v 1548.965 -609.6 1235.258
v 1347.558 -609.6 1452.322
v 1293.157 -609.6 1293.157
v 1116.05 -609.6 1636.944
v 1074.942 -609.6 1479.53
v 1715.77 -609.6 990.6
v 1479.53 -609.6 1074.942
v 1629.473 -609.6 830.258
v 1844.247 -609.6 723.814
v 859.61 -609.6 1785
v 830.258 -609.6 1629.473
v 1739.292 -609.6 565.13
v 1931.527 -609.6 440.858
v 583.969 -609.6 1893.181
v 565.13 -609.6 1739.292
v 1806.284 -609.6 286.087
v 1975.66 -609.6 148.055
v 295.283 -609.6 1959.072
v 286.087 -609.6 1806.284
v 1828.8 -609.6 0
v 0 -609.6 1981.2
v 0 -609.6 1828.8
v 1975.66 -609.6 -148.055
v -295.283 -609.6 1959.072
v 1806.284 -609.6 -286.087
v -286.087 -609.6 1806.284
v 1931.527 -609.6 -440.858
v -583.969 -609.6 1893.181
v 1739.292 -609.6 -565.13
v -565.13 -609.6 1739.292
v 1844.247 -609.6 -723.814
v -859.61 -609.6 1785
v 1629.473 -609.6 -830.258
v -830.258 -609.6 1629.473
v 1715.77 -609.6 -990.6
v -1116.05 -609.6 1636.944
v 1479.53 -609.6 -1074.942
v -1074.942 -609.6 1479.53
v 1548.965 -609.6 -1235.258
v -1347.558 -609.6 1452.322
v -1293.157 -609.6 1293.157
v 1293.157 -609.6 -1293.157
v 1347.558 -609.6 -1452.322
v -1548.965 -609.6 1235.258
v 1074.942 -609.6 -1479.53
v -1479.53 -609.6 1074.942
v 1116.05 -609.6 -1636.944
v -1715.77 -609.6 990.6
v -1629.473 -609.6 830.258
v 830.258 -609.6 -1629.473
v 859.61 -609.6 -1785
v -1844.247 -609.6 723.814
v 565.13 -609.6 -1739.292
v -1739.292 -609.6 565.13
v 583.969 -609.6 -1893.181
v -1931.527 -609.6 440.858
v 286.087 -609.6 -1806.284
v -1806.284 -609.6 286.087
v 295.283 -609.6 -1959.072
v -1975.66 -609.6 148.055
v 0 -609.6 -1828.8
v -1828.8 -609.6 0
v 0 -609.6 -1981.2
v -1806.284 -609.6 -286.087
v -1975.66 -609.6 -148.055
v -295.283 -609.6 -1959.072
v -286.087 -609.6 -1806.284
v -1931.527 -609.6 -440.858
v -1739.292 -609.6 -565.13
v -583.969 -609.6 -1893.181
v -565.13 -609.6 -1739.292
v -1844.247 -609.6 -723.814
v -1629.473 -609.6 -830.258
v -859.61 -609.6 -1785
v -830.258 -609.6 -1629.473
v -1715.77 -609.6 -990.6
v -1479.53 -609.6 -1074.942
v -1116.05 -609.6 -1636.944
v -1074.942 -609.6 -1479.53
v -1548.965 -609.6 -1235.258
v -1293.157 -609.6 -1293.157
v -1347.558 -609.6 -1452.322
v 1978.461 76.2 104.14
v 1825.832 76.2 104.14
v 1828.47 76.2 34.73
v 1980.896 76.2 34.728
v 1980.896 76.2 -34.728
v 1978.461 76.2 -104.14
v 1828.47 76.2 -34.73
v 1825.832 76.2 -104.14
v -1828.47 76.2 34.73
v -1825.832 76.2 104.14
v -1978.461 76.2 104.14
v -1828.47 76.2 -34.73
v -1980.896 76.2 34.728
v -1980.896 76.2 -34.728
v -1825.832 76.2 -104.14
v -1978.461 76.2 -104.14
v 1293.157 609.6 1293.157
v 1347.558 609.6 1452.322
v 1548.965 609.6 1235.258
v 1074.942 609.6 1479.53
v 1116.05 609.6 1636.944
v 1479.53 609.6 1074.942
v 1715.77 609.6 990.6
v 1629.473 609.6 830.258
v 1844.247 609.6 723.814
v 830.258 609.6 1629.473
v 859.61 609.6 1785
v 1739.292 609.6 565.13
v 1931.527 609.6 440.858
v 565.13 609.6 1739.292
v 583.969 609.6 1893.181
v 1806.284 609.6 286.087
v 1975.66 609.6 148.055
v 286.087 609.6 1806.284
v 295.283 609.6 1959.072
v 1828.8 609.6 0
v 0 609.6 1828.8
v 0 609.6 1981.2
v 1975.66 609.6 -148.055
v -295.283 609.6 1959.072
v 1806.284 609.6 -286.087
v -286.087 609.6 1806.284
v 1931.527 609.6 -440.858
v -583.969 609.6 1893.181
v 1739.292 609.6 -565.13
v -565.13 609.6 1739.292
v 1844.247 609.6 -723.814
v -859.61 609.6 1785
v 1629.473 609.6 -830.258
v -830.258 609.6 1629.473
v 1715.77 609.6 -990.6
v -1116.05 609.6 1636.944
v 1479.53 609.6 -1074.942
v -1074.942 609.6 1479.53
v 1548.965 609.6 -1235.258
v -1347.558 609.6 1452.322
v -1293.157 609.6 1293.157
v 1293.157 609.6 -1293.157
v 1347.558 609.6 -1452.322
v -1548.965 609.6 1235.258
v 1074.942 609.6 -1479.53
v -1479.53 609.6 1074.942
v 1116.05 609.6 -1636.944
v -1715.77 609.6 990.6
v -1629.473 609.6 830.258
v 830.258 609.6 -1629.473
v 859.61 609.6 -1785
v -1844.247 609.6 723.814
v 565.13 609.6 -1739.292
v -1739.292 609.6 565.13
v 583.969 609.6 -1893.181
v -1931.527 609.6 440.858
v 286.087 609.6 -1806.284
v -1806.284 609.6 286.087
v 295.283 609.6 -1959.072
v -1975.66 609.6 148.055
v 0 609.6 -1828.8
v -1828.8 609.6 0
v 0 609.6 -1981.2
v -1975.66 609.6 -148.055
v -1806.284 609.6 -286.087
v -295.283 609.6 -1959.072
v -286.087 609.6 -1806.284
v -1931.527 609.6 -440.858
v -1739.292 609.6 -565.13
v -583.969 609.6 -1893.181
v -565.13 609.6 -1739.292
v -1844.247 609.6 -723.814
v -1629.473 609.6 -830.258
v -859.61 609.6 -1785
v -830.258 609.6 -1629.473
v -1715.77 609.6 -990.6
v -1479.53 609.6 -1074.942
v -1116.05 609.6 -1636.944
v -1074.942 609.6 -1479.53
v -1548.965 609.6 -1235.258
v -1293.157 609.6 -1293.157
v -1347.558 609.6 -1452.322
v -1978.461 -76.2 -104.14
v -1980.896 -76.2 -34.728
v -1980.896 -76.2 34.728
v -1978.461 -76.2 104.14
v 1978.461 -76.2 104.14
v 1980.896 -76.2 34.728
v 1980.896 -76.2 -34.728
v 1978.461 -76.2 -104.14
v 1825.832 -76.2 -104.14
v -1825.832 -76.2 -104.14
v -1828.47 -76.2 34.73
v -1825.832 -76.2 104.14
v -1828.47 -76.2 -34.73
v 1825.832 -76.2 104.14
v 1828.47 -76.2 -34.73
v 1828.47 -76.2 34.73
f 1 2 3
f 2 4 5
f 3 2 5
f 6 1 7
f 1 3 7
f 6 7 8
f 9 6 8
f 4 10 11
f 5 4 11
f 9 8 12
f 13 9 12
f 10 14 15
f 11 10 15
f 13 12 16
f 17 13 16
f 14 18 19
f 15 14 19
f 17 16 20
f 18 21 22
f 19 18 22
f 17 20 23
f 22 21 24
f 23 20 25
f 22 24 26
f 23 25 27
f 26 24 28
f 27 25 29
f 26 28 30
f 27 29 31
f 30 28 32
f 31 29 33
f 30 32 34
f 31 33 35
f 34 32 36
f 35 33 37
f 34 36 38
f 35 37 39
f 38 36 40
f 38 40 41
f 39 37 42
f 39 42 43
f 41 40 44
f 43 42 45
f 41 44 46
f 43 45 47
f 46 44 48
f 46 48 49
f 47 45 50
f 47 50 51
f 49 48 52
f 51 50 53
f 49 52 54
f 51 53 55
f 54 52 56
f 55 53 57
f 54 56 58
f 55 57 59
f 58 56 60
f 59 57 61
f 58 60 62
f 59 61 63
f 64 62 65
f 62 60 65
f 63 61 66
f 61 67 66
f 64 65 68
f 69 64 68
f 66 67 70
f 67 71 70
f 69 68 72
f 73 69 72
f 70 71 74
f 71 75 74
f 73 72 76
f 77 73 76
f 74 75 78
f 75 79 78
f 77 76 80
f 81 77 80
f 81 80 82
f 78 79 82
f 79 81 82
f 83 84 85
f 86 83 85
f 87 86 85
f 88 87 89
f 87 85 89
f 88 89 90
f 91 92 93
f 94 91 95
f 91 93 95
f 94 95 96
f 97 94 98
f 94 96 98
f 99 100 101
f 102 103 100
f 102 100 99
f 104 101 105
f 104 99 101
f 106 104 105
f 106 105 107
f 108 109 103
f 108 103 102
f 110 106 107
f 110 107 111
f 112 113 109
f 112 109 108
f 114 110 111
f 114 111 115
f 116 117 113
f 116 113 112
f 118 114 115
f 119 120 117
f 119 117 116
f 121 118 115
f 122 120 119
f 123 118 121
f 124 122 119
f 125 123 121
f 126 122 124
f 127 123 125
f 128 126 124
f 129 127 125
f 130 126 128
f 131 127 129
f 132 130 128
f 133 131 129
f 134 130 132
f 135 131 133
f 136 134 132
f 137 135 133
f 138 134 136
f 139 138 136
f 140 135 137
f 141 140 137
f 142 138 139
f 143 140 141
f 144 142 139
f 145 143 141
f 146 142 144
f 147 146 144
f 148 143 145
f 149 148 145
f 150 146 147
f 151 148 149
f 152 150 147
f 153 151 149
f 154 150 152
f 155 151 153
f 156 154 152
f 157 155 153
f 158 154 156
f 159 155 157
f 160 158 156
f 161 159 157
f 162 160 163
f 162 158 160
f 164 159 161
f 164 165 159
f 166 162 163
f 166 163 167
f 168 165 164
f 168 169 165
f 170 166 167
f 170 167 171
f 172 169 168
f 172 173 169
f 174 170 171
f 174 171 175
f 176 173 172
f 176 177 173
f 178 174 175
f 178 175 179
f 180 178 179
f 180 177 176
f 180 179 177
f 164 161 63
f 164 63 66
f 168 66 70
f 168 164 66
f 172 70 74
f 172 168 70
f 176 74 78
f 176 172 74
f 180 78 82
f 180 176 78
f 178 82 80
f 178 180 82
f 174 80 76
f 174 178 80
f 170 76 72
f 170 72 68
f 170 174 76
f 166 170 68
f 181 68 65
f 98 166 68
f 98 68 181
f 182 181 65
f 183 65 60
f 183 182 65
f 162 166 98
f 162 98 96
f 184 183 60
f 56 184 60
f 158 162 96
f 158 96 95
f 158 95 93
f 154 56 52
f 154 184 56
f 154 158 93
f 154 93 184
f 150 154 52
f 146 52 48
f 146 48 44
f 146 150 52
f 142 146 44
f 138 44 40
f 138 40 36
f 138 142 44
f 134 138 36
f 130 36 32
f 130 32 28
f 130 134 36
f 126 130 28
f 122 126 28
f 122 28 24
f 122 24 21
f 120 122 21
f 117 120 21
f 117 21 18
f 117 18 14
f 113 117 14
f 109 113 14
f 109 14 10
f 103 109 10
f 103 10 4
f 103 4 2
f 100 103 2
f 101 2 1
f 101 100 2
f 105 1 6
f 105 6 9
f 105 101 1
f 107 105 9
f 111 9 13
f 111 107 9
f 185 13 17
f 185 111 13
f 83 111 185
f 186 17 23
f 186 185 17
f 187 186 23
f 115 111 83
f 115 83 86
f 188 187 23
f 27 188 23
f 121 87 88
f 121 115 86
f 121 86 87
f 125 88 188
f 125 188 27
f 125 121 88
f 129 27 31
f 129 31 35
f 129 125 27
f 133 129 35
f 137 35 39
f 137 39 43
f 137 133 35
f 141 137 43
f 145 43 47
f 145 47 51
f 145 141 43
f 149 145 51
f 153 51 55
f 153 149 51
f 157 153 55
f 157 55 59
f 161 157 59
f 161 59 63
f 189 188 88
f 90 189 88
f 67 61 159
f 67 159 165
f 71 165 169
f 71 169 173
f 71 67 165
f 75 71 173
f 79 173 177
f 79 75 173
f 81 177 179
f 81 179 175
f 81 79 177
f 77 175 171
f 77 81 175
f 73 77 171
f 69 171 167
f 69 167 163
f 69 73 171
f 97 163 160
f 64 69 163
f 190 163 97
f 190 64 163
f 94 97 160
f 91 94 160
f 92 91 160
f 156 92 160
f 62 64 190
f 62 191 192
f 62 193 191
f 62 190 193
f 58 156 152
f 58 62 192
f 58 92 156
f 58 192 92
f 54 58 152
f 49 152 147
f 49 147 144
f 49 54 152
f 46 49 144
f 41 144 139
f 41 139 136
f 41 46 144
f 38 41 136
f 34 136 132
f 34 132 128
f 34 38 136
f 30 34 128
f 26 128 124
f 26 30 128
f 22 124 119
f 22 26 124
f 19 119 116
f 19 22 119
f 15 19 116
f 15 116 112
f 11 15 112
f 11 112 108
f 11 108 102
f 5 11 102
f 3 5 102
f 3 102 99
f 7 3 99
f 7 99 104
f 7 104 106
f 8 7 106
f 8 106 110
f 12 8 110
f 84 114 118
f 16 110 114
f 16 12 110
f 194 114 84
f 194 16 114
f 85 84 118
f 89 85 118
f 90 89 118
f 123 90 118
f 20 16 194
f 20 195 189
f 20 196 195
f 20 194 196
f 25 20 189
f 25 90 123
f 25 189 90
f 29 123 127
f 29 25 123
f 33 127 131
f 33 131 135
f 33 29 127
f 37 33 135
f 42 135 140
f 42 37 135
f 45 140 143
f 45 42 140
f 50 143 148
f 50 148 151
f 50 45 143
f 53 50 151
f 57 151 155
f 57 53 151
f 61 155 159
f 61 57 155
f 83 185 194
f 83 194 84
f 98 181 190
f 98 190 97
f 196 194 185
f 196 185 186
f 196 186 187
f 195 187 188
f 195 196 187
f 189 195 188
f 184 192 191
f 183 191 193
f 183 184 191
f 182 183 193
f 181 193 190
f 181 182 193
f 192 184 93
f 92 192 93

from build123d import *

# Parameters (mm, degrees)
SKETCH1_R               = 1981.2
SKETCH1_R_2             = 1828.8
BOSS_EXTRUDE1_DEPTH     = 609.6
CUT_EXTRUDE1_DEPTH      = 2868.388888867
CUT_EXTRUDE1_DEPTH_BACK = 2868.388888867
SKETCH2_W               = 208.28
SKETCH2_H               = 152.4


with BuildPart() as part:
    # Sketch1 → Boss-Extrude1 (new, symmetric)
    with BuildSketch(Plane(origin=(0, 0, 0), x_dir=(1, 0, 0), z_dir=(0, 1, 0))):
        with Locations(Location((0, 0, 0), (0, 0, 90))):
            Circle(SKETCH1_R)
        with Locations(Location((0, 0, 0), (0, 0, 90))):
            Circle(SKETCH1_R_2, mode=Mode.SUBTRACT)
    extrude(amount=BOSS_EXTRUDE1_DEPTH, both=True)

    # Sketch2 → Cut-Extrude1 (cut, two sides: drawn at the far end of the back side and taken through both)
    with BuildSketch(Plane(origin=(0, 0, 0), x_dir=(0, 0, -1), z_dir=(1, 0, 0)).offset(-CUT_EXTRUDE1_DEPTH_BACK)):
        Rectangle(SKETCH2_W, SKETCH2_H)
    extrude(amount=CUT_EXTRUDE1_DEPTH + CUT_EXTRUDE1_DEPTH_BACK, mode=Mode.SUBTRACT)


solid = part.part
